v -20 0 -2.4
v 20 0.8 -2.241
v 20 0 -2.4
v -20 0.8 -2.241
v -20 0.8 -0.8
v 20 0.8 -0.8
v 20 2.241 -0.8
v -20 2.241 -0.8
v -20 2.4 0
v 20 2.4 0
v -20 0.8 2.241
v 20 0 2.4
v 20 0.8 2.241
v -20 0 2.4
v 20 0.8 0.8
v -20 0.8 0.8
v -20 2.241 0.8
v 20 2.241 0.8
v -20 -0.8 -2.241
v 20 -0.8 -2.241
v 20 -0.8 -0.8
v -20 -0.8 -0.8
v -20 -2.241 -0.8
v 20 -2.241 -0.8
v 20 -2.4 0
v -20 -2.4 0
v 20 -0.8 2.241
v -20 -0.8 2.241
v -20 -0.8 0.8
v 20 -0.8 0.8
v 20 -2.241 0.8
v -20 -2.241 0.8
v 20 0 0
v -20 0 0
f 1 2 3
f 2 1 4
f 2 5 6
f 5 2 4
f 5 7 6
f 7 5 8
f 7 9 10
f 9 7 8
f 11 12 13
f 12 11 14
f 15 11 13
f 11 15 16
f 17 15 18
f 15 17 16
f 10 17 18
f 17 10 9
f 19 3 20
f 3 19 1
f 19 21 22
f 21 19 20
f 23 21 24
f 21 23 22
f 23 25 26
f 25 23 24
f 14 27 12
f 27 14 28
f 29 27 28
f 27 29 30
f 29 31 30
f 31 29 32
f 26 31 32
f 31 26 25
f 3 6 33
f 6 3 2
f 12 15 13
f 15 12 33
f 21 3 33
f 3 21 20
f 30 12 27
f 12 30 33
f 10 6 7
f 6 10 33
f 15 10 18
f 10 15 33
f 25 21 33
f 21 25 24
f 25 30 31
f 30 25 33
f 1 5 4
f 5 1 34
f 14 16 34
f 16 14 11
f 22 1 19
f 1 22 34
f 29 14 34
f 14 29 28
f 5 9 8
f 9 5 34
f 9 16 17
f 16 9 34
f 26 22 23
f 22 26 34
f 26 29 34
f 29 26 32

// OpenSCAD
// file: ../p/4-4edge.scad
use <../lib.scad>
$fa=1; $fs=0.2;
function ldraw_lib__4_4edge(realsolid=false) = [
// 0 Circle 1.0
// 0 Name: 4-4edge.dat
// 0 Author: James Jessiman
// 0 !LDRAW_ORG Primitive UPDATE 2017-01
// 0 !LICENSE Licensed under CC BY 2.0 and CC BY 4.0 : see CAreadme.txt
// 
// 0 BFC CERTIFY CCW
  [0,"BFC","CERTIFY"],
  [0,"BFC","CCW"],
// 
// 0 !HISTORY 1998-12-15 [PTadmin] Official Update 1998-10
// 0 !HISTORY 2005-12-28 [PTadmin] Official Update 2005-01
// 0 !HISTORY 2007-06-24 [PTadmin] Header formatted for Contributor Agreement
// 0 !HISTORY 2008-07-01 [PTadmin] Official Update 2008-01
// 0 !HISTORY 2017-01-15 [Steffen] BFCed
// 0 !HISTORY 2017-12-30 [PTadmin] Official Update 2017-01
// 
// 
// 2 24 1 0 0 0.9239 0 0.3827
  [2,24,1,0,0,0.9239,0,0.3827],
// 2 24 0.9239 0 0.3827 0.7071 0 0.7071
  [2,24,0.9239,0,0.3827,0.7071,0,0.7071],
// 2 24 0.7071 0 0.7071 0.3827 0 0.9239
  [2,24,0.7071,0,0.7071,0.3827,0,0.9239],
// 2 24 0.3827 0 0.9239 0 0 1
  [2,24,0.3827,0,0.9239,0,0,1],
// 2 24 0 0 1 -0.3827 0 0.9239
  [2,24,0,0,1,-0.3827,0,0.9239],
// 2 24 -0.3827 0 0.9239 -0.7071 0 0.7071
  [2,24,-0.3827,0,0.9239,-0.7071,0,0.7071],
// 2 24 -0.7071 0 0.7071 -0.9239 0 0.3827
  [2,24,-0.7071,0,0.7071,-0.9239,0,0.3827],
// 2 24 -0.9239 0 0.3827 -1 0 -0
  [2,24,-0.9239,0,0.3827,-1,0,-0],
// 2 24 -1 0 -0 -0.9239 0 -0.3827
  [2,24,-1,0,-0,-0.9239,0,-0.3827],
// 2 24 -0.9239 0 -0.3827 -0.7071 0 -0.7071
  [2,24,-0.9239,0,-0.3827,-0.7071,0,-0.7071],
// 2 24 -0.7071 0 -0.7071 -0.3827 0 -0.9239
  [2,24,-0.7071,0,-0.7071,-0.3827,0,-0.9239],
// 2 24 -0.3827 0 -0.9239 0 0 -1
  [2,24,-0.3827,0,-0.9239,0,0,-1],
// 2 24 0 0 -1 0.3827 0 -0.9239
  [2,24,0,0,-1,0.3827,0,-0.9239],
// 2 24 0.3827 0 -0.9239 0.7071 0 -0.7071
  [2,24,0.3827,0,-0.9239,0.7071,0,-0.7071],
// 2 24 0.7071 0 -0.7071 0.9239 0 -0.3827
  [2,24,0.7071,0,-0.7071,0.9239,0,-0.3827],
// 2 24 0.9239 0 -0.3827 1 0 0
  [2,24,0.9239,0,-0.3827,1,0,0],
];
module ldraw_lib__4_4edge(step=0, col=false, unit=2/5, alt=false, line=0.2, solid=!$preview)
    makepoly(ldraw_lib__4_4edge(solid), step=step, col=col, unit=unit, alt=alt, line=line, solid=solid);
ldraw_lib__4_4edge(line=0.2);
// file: ../p/4-4disc.scad
use <../lib.scad>
$fa=1; $fs=0.2;
function ldraw_lib__4_4disc(realsolid=false) = [
// 0 Disc 1.0
// 0 Name: 4-4disc.dat
// 0 Author: James Jessiman
// 0 !LDRAW_ORG Primitive UPDATE 2002-02
// 0 !LICENSE Licensed under CC BY 2.0 and CC BY 4.0 : see CAreadme.txt
// 
// 0 BFC CERTIFY CCW
  [0,"BFC","CERTIFY"],
  [0,"BFC","CCW"],
// 
// 0 !HISTORY 1998-12-15 [PTadmin] Official Update 1998-10
// 0 !HISTORY 2002-03-23 [sbliss] Added BFC statement
// 0 !HISTORY 2002-04-25 [PTadmin] Official Update 2002-02
// 0 !HISTORY 2007-06-24 [PTadmin] Header formatted for Contributor Agreement
// 0 !HISTORY 2008-07-01 [PTadmin] Official Update 2008-01
// 
// 
// 3 16 0 0 0 1 0 0 0.9239 0 0.3827
  [3,16,0,0,0,1,0,0,0.9239,0,0.3827],
// 3 16 0 0 0 0.9239 0 0.3827 0.7071 0 0.7071
  [3,16,0,0,0,0.9239,0,0.3827,0.7071,0,0.7071],
// 3 16 0 0 0 0.7071 0 0.7071 0.3827 0 0.9239
  [3,16,0,0,0,0.7071,0,0.7071,0.3827,0,0.9239],
// 3 16 0 0 0 0.3827 0 0.9239 0 0 1
  [3,16,0,0,0,0.3827,0,0.9239,0,0,1],
// 3 16 0 0 0 0 0 1 -0.3827 0 0.9239
  [3,16,0,0,0,0,0,1,-0.3827,0,0.9239],
// 3 16 0 0 0 -0.3827 0 0.9239 -0.7071 0 0.7071
  [3,16,0,0,0,-0.3827,0,0.9239,-0.7071,0,0.7071],
// 3 16 0 0 0 -0.7071 0 0.7071 -0.9239 0 0.3827
  [3,16,0,0,0,-0.7071,0,0.7071,-0.9239,0,0.3827],
// 3 16 0 0 0 -0.9239 0 0.3827 -1 0 -0
  [3,16,0,0,0,-0.9239,0,0.3827,-1,0,-0],
// 3 16 0 0 0 -1 0 -0 -0.9239 0 -0.3827
  [3,16,0,0,0,-1,0,-0,-0.9239,0,-0.3827],
// 3 16 0 0 0 -0.9239 0 -0.3827 -0.7071 0 -0.7071
  [3,16,0,0,0,-0.9239,0,-0.3827,-0.7071,0,-0.7071],
// 3 16 0 0 0 -0.7071 0 -0.7071 -0.3827 0 -0.9239
  [3,16,0,0,0,-0.7071,0,-0.7071,-0.3827,0,-0.9239],
// 3 16 0 0 0 -0.3827 0 -0.9239 0 0 -1
  [3,16,0,0,0,-0.3827,0,-0.9239,0,0,-1],
// 3 16 0 0 0 0 0 -1 0.3827 0 -0.9239
  [3,16,0,0,0,0,0,-1,0.3827,0,-0.9239],
// 3 16 0 0 0 0.3827 0 -0.9239 0.7071 0 -0.7071
  [3,16,0,0,0,0.3827,0,-0.9239,0.7071,0,-0.7071],
// 3 16 0 0 0 0.7071 0 -0.7071 0.9239 0 -0.3827
  [3,16,0,0,0,0.7071,0,-0.7071,0.9239,0,-0.3827],
// 3 16 0 0 0 0.9239 0 -0.3827 1 0 0
  [3,16,0,0,0,0.9239,0,-0.3827,1,0,0],
// 0
];
module ldraw_lib__4_4disc(step=0, col=false, unit=2/5, alt=false, line=0.2, solid=!$preview)
    makepoly(ldraw_lib__4_4disc(solid), step=step, col=col, unit=unit, alt=alt, line=line, solid=solid);
ldraw_lib__4_4disc(line=0.2);
// file: ../p/4-4cyli.scad
use <../lib.scad>
$fa=1; $fs=0.2;
function ldraw_lib__4_4cyli(realsolid=false) = [
// 0 Cylinder 1.0
// 0 Name: 4-4cyli.dat
// 0 Author: James Jessiman
// 0 !LDRAW_ORG Primitive UPDATE 2005-01
// 0 !LICENSE Licensed under CC BY 2.0 and CC BY 4.0 : see CAreadme.txt
// 
// 0 BFC CERTIFY CCW
  [0,"BFC","CERTIFY"],
  [0,"BFC","CCW"],
// 
// 0 !HISTORY 1998-12-15 [PTadmin] Official Update 1998-10
// 0 !HISTORY 2002-03-23 [sbliss] Added BFC statement; merged headers from files in distributions LDraw 0.27 and Complete.
// 0 !HISTORY 2002-04-25 [PTadmin] Official Update 2002-02
// 0 !HISTORY 2004-12-14 [guyvivan] BFC CCW
// 0 !HISTORY 2005-12-28 [PTadmin] Official Update 2005-01
// 0 !HISTORY 2007-06-24 [PTadmin] Header formatted for Contributor Agreement
// 0 !HISTORY 2008-07-01 [PTadmin] Official Update 2008-01
// 
// 
// 4 16 1 1 0 0.9239 1 0.3827 0.9239 0 0.3827 1 0 0
  [4,16,1,1,0,0.9239,1,0.3827,0.9239,0,0.3827,1,0,0],
// 5 24 1 0 0 1 1 0 0.9239 0 0.3827 0.9239 0 -0.3827
  [5,24,1,0,0,1,1,0,0.9239,0,0.3827,0.9239,0,-0.3827],
// 4 16 0.9239 1 0.3827 0.7071 1 0.7071 0.7071 0 0.7071 0.9239 0 0.3827
  [4,16,0.9239,1,0.3827,0.7071,1,0.7071,0.7071,0,0.7071,0.9239,0,0.3827],
// 5 24 0.9239 0 0.3827 0.9239 1 0.3827 0.7071 0 0.7071 1 0 0
  [5,24,0.9239,0,0.3827,0.9239,1,0.3827,0.7071,0,0.7071,1,0,0],
// 4 16 0.7071 1 0.7071 0.3827 1 0.9239 0.3827 0 0.9239 0.7071 0 0.7071
  [4,16,0.7071,1,0.7071,0.3827,1,0.9239,0.3827,0,0.9239,0.7071,0,0.7071],
// 5 24 0.7071 0 0.7071 0.7071 1 0.7071 0.3827 0 0.9239 0.9239 0 0.3827
  [5,24,0.7071,0,0.7071,0.7071,1,0.7071,0.3827,0,0.9239,0.9239,0,0.3827],
// 4 16 0.3827 1 0.9239 0 1 1 0 0 1 0.3827 0 0.9239
  [4,16,0.3827,1,0.9239,0,1,1,0,0,1,0.3827,0,0.9239],
// 5 24 0.3827 0 0.9239 0.3827 1 0.9239 0 0 1 0.7071 0 0.7071
  [5,24,0.3827,0,0.9239,0.3827,1,0.9239,0,0,1,0.7071,0,0.7071],
// 4 16 0 1 1 -0.3827 1 0.9239 -0.3827 0 0.9239 0 0 1
  [4,16,0,1,1,-0.3827,1,0.9239,-0.3827,0,0.9239,0,0,1],
// 5 24 0 0 1 0 1 1 -0.3827 0 0.9239 0.3827 0 0.9239
  [5,24,0,0,1,0,1,1,-0.3827,0,0.9239,0.3827,0,0.9239],
// 4 16 -0.3827 1 0.9239 -0.7071 1 0.7071 -0.7071 0 0.7071 -0.3827 0 0.9239
  [4,16,-0.3827,1,0.9239,-0.7071,1,0.7071,-0.7071,0,0.7071,-0.3827,0,0.9239],
// 5 24 -0.3827 0 0.9239 -0.3827 1 0.9239 -0.7071 0 0.7071 0 0 1
  [5,24,-0.3827,0,0.9239,-0.3827,1,0.9239,-0.7071,0,0.7071,0,0,1],
// 4 16 -0.7071 1 0.7071 -0.9239 1 0.3827 -0.9239 0 0.3827 -0.7071 0 0.7071
  [4,16,-0.7071,1,0.7071,-0.9239,1,0.3827,-0.9239,0,0.3827,-0.7071,0,0.7071],
// 5 24 -0.7071 0 0.7071 -0.7071 1 0.7071 -0.9239 0 0.3827 -0.3827 0 0.9239
  [5,24,-0.7071,0,0.7071,-0.7071,1,0.7071,-0.9239,0,0.3827,-0.3827,0,0.9239],
// 4 16 -0.9239 1 0.3827 -1 1 0 -1 0 0 -0.9239 0 0.3827
  [4,16,-0.9239,1,0.3827,-1,1,0,-1,0,0,-0.9239,0,0.3827],
// 5 24 -0.9239 0 0.3827 -0.9239 1 0.3827 -1 0 0 -0.7071 0 0.7071
  [5,24,-0.9239,0,0.3827,-0.9239,1,0.3827,-1,0,0,-0.7071,0,0.7071],
// 4 16 -1 1 0 -0.9239 1 -0.3827 -0.9239 0 -0.3827 -1 0 0
  [4,16,-1,1,0,-0.9239,1,-0.3827,-0.9239,0,-0.3827,-1,0,0],
// 5 24 -1 0 0 -1 1 0 -0.9239 0 -0.3827 -0.9239 0 0.3827
  [5,24,-1,0,0,-1,1,0,-0.9239,0,-0.3827,-0.9239,0,0.3827],
// 4 16 -0.9239 1 -0.3827 -0.7071 1 -0.7071 -0.7071 0 -0.7071 -0.9239 0 -0.3827
  [4,16,-0.9239,1,-0.3827,-0.7071,1,-0.7071,-0.7071,0,-0.7071,-0.9239,0,-0.3827],
// 5 24 -0.9239 0 -0.3827 -0.9239 1 -0.3827 -0.7071 0 -0.7071 -1 0 0
  [5,24,-0.9239,0,-0.3827,-0.9239,1,-0.3827,-0.7071,0,-0.7071,-1,0,0],
// 4 16 -0.7071 1 -0.7071 -0.3827 1 -0.9239 -0.3827 0 -0.9239 -0.7071 0 -0.7071
  [4,16,-0.7071,1,-0.7071,-0.3827,1,-0.9239,-0.3827,0,-0.9239,-0.7071,0,-0.7071],
// 5 24 -0.7071 0 -0.7071 -0.7071 1 -0.7071 -0.3827 0 -0.9239 -0.9239 0 -0.3827
  [5,24,-0.7071,0,-0.7071,-0.7071,1,-0.7071,-0.3827,0,-0.9239,-0.9239,0,-0.3827],
// 4 16 -0.3827 1 -0.9239 0 1 -1 0 0 -1 -0.3827 0 -0.9239
  [4,16,-0.3827,1,-0.9239,0,1,-1,0,0,-1,-0.3827,0,-0.9239],
// 5 24 -0.3827 0 -0.9239 -0.3827 1 -0.9239 0 0 -1 -0.7071 0 -0.7071
  [5,24,-0.3827,0,-0.9239,-0.3827,1,-0.9239,0,0,-1,-0.7071,0,-0.7071],
// 4 16 0 1 -1 0.3827 1 -0.9239 0.3827 0 -0.9239 0 0 -1
  [4,16,0,1,-1,0.3827,1,-0.9239,0.3827,0,-0.9239,0,0,-1],
// 5 24 0 0 -1 0 1 -1 0.3827 0 -0.9239 -0.3827 0 -0.9239
  [5,24,0,0,-1,0,1,-1,0.3827,0,-0.9239,-0.3827,0,-0.9239],
// 4 16 0.3827 1 -0.9239 0.7071 1 -0.7071 0.7071 0 -0.7071 0.3827 0 -0.9239
  [4,16,0.3827,1,-0.9239,0.7071,1,-0.7071,0.7071,0,-0.7071,0.3827,0,-0.9239],
// 5 24 0.3827 0 -0.9239 0.3827 1 -0.9239 0.7071 0 -0.7071 0 0 -1
  [5,24,0.3827,0,-0.9239,0.3827,1,-0.9239,0.7071,0,-0.7071,0,0,-1],
// 4 16 0.7071 1 -0.7071 0.9239 1 -0.3827 0.9239 0 -0.3827 0.7071 0 -0.7071
  [4,16,0.7071,1,-0.7071,0.9239,1,-0.3827,0.9239,0,-0.3827,0.7071,0,-0.7071],
// 5 24 0.7071 0 -0.7071 0.7071 1 -0.7071 0.9239 0 -0.3827 0.3827 0 -0.9239
  [5,24,0.7071,0,-0.7071,0.7071,1,-0.7071,0.9239,0,-0.3827,0.3827,0,-0.9239],
// 4 16 0.9239 1 -0.3827 1 1 0 1 0 0 0.9239 0 -0.3827
  [4,16,0.9239,1,-0.3827,1,1,0,1,0,0,0.9239,0,-0.3827],
// 5 24 0.9239 0 -0.3827 0.9239 1 -0.3827 1 0 0 0.7071 0 -0.7071
  [5,24,0.9239,0,-0.3827,0.9239,1,-0.3827,1,0,0,0.7071,0,-0.7071],
// 0
];
module ldraw_lib__4_4cyli(step=0, col=false, unit=2/5, alt=false, line=0.2, solid=!$preview)
    makepoly(ldraw_lib__4_4cyli(solid), step=step, col=col, unit=unit, alt=alt, line=line, solid=solid);
ldraw_lib__4_4cyli(line=0.2);
// file: ../p/stud3.scad
use <../lib.scad>
use <4-4cyli.scad>
use <4-4disc.scad>
use <4-4edge.scad>
$fa=1; $fs=0.2;
function ldraw_lib__stud3(realsolid=false) = realsolid ? 
    [openscad(translate([0,0,-eps()], o=cylinder(4+eps(), r=4)),2)] : [
// 0 Stud Tube Solid
// 0 Name: stud3.dat
// 0 Author: James Jessiman
// 0 !LDRAW_ORG Primitive UPDATE 2012-01
// 0 !LICENSE Licensed under CC BY 2.0 and CC BY 4.0 : see CAreadme.txt
// 
// 0 BFC CERTIFY CCW
  [0,"BFC","CERTIFY"],
  [0,"BFC","CCW"],
// 
// 0 !HISTORY 2002-04-04 [sbliss] Modified for BFC compliance
// 0 !HISTORY 2002-04-25 [PTadmin] Official Update 2002-02
// 0 !HISTORY 2007-06-24 [PTadmin] Header formatted for Contributor Agreement
// 0 !HISTORY 2008-07-01 [PTadmin] Official Update 2008-01
// 0 !HISTORY 2012-02-16 [Philo] Changed to CCW
// 0 !HISTORY 2012-03-30 [PTadmin] Official Update 2012-01
// 
// 
// 1 16 0 -4 0 4 0 0 0 1 0 0 0 4 4-4edge.dat
  [1,16,0,-4,0,4,0,0,0,1,0,0,0,4, ldraw_lib__4_4edge(realsolid)],
// 1 16 0 0 0 4 0 0 0 1 0 0 0 4 4-4edge.dat
  [1,16,0,0,0,4,0,0,0,1,0,0,0,4, ldraw_lib__4_4edge(realsolid)],
// 1 16 0 -4 0 4 0 0 0 1 0 0 0 4 4-4disc.dat
  [1,16,0,-4,0,4,0,0,0,1,0,0,0,4, ldraw_lib__4_4disc(realsolid)],
// 1 16 0 -4 0 4 0 0 0 4 0 0 0 4 4-4cyli.dat
  [1,16,0,-4,0,4,0,0,0,4,0,0,0,4, ldraw_lib__4_4cyli(realsolid)],
];
module ldraw_lib__stud3(step=0, col=false, unit=2/5, alt=false, line=0.2, solid=!$preview)
    makepoly(ldraw_lib__stud3(solid), step=step, col=col, unit=unit, alt=alt, line=line, solid=solid);
ldraw_lib__stud3(line=0.2);
// file: ../p/stud.scad
use <../lib.scad>
use <4-4cyli.scad>
use <4-4disc.scad>
use <4-4edge.scad>
$fa=1; $fs=0.2;
function ldraw_lib__stud(realsolid=false) = realsolid ? 
    [openscad(translate([0,0,-eps()], o=cylinder(4+eps(), r=6)),2)] : [
// 0 Stud
// 0 Name: stud.dat
// 0 Author: James Jessiman
// 0 !LDRAW_ORG Primitive UPDATE 2012-01
// 0 !LICENSE Licensed under CC BY 2.0 and CC BY 4.0 : see CAreadme.txt
// 
// 0 BFC CERTIFY CCW
  [0,"BFC","CERTIFY"],
  [0,"BFC","CCW"],
// 
// 0 !HISTORY 2002-04-04 [sbliss] Modified for BFC compliance
// 0 !HISTORY 2002-04-25 [PTadmin] Official Update 2002-02
// 0 !HISTORY 2007-06-24 [PTadmin] Header formatted for Contributor Agreement
// 0 !HISTORY 2008-07-01 [PTadmin] Official Update 2008-01
// 0 !HISTORY 2012-02-16 [Philo] Changed to CCW
// 0 !HISTORY 2012-03-30 [PTadmin] Official Update 2012-01
// 
// 
// 1 16 0 0 0 6 0 0 0 1 0 0 0 6 4-4edge.dat
  [1,16,0,0,0,6,0,0,0,1,0,0,0,6, ldraw_lib__4_4edge(realsolid)],
// 1 16 0 -4 0 6 0 0 0 1 0 0 0 6 4-4edge.dat
  [1,16,0,-4,0,6,0,0,0,1,0,0,0,6, ldraw_lib__4_4edge(realsolid)],
// 1 16 0 0 0 6 0 0 0 -4 0 0 0 6 4-4cyli.dat
  [1,16,0,0,0,6,0,0,0,-4,0,0,0,6, ldraw_lib__4_4cyli(realsolid)],
// 1 16 0 -4 0 6 0 0 0 1 0 0 0 6 4-4disc.dat
  [1,16,0,-4,0,6,0,0,0,1,0,0,0,6, ldraw_lib__4_4disc(realsolid)],
];
module ldraw_lib__stud(step=0, col=false, unit=2/5, alt=false, line=0.2, solid=!$preview)
    makepoly(ldraw_lib__stud(solid), step=step, col=col, unit=unit, alt=alt, line=line, solid=solid);
ldraw_lib__stud(line=0.2);
// file: ../p/box5.scad
use <../lib.scad>
$fa=1; $fs=0.2;
function ldraw_lib__box5(realsolid=false) = [
// 0 Box with 5 Faces and All Edges
// 0 Name: box5.dat
// 0 Author: James Jessiman
// 0 !LDRAW_ORG Primitive UPDATE 2012-01
// 0 !LICENSE Licensed under CC BY 2.0 and CC BY 4.0 : see CAreadme.txt
// 
// 0 BFC CERTIFY CCW
  [0,"BFC","CERTIFY"],
  [0,"BFC","CCW"],
// 
// 0 !HISTORY 2002-04-03 [sbliss] Modified for BFC compliance
// 0 !HISTORY 2002-04-25 [PTadmin] Official Update 2002-02
// 0 !HISTORY 2007-06-24 [PTadmin] Header formatted for Contributor Agreement
// 0 !HISTORY 2008-07-01 [PTadmin] Official Update 2008-01
// 0 !HISTORY 2012-02-16 [Philo] Changed to CCW
// 0 !HISTORY 2012-03-30 [PTadmin] Official Update 2012-01
// 
// 
// 2 24 1 1 1 -1 1 1
  [2,24,1,1,1,-1,1,1],
// 2 24 -1 1 1 -1 1 -1
  [2,24,-1,1,1,-1,1,-1],
// 2 24 -1 1 -1 1 1 -1
  [2,24,-1,1,-1,1,1,-1],
// 2 24 1 1 -1 1 1 1
  [2,24,1,1,-1,1,1,1],
// 2 24 1 0 1 -1 0 1
  [2,24,1,0,1,-1,0,1],
// 2 24 -1 0 1 -1 0 -1
  [2,24,-1,0,1,-1,0,-1],
// 2 24 -1 0 -1 1 0 -1
  [2,24,-1,0,-1,1,0,-1],
// 2 24 1 0 -1 1 0 1
  [2,24,1,0,-1,1,0,1],
// 2 24 1 0 1 1 1 1
  [2,24,1,0,1,1,1,1],
// 2 24 -1 0 1 -1 1 1
  [2,24,-1,0,1,-1,1,1],
// 2 24 1 0 -1 1 1 -1
  [2,24,1,0,-1,1,1,-1],
// 2 24 -1 0 -1 -1 1 -1
  [2,24,-1,0,-1,-1,1,-1],
// 4 16 -1 1 1 1 1 1 1 1 -1 -1 1 -1
  [4,16,-1,1,1,1,1,1,1,1,-1,-1,1,-1],
// 4 16 -1 1 1 -1 0 1 1 0 1 1 1 1
  [4,16,-1,1,1,-1,0,1,1,0,1,1,1,1],
// 4 16 -1 1 -1 -1 0 -1 -1 0 1 -1 1 1
  [4,16,-1,1,-1,-1,0,-1,-1,0,1,-1,1,1],
// 4 16 1 1 -1 1 0 -1 -1 0 -1 -1 1 -1
  [4,16,1,1,-1,1,0,-1,-1,0,-1,-1,1,-1],
// 4 16 1 1 1 1 0 1 1 0 -1 1 1 -1
  [4,16,1,1,1,1,0,1,1,0,-1,1,1,-1],
];
module ldraw_lib__box5(step=0, col=false, unit=2/5, alt=false, line=0.2, solid=!$preview)
    makepoly(ldraw_lib__box5(solid), step=step, col=col, unit=unit, alt=alt, line=line, solid=solid);
ldraw_lib__box5(line=0.2);
// file: ../p/box4t.scad
use <../lib.scad>
$fa=1; $fs=0.2;
function ldraw_lib__box4t(realsolid=false) = [
// 0 Box with 4 Adjacent Faces and All Edges
// 0 Name: box4t.dat
// 0 Author: Tore Eriksson [Tore_Eriksson]
// 0 !LDRAW_ORG Primitive UPDATE 2003-02
// 0 !LICENSE Licensed under CC BY 2.0 and CC BY 4.0 : see CAreadme.txt
// 
// 0 BFC CERTIFY CCW
  [0,"BFC","CERTIFY"],
  [0,"BFC","CCW"],
// 
// 0 !HISTORY 1997-09-29 [PTadmin] Official Update 1997-15
// 0 !HISTORY 2002-08-31 [izanette] Modified with WINDZ for BFC compliance
// 0 !HISTORY 2003-08-01 [PTadmin] Official Update 2003-02
// 0 !HISTORY 2007-06-24 [PTadmin] Header formatted for Contributor Agreement
// 0 !HISTORY 2008-07-01 [PTadmin] Official Update 2008-01
// 
// 
// 2 24 1 1 1 -1 1 1
  [2,24,1,1,1,-1,1,1],
// 2 24 -1 1 1 -1 1 -1
  [2,24,-1,1,1,-1,1,-1],
// 2 24 -1 1 -1 1 1 -1
  [2,24,-1,1,-1,1,1,-1],
// 2 24 1 1 -1 1 1 1
  [2,24,1,1,-1,1,1,1],
// 2 24 1 0 1 -1 0 1
  [2,24,1,0,1,-1,0,1],
// 2 24 -1 0 1 -1 0 -1
  [2,24,-1,0,1,-1,0,-1],
// 2 24 -1 0 -1 1 0 -1
  [2,24,-1,0,-1,1,0,-1],
// 2 24 1 0 -1 1 0 1
  [2,24,1,0,-1,1,0,1],
// 2 24 1 0 1 1 1 1
  [2,24,1,0,1,1,1,1],
// 2 24 -1 0 1 -1 1 1
  [2,24,-1,0,1,-1,1,1],
// 2 24 1 0 -1 1 1 -1
  [2,24,1,0,-1,1,1,-1],
// 2 24 -1 0 -1 -1 1 -1
  [2,24,-1,0,-1,-1,1,-1],
// 4 16 1 1 1 1 1 -1 -1 1 -1 -1 1 1
  [4,16,1,1,1,1,1,-1,-1,1,-1,-1,1,1],
// 4 16 1 1 1 -1 1 1 -1 0 1 1 0 1
  [4,16,1,1,1,-1,1,1,-1,0,1,1,0,1],
// 4 16 -1 1 1 -1 1 -1 -1 0 -1 -1 0 1
  [4,16,-1,1,1,-1,1,-1,-1,0,-1,-1,0,1],
// 0 4 16 -1 1 -1 -1 0 -1 1 0 -1 1 1 -1
// 4 16 1 1 -1 1 1 1 1 0 1 1 0 -1
  [4,16,1,1,-1,1,1,1,1,0,1,1,0,-1],
// 0
];
module ldraw_lib__box4t(step=0, col=false, unit=2/5, alt=false, line=0.2, solid=!$preview)
    makepoly(ldraw_lib__box4t(solid), step=step, col=col, unit=unit, alt=alt, line=line, solid=solid);
ldraw_lib__box4t(line=0.2);
// file: s/3004s01.scad
use <../../lib.scad>
use <../../p/box4t.scad>
use <../../p/box5.scad>
use <../../p/stud.scad>
use <../../p/stud3.scad>
$fa=1; $fs=0.2;
function ldraw_lib__s__3004s01(realsolid=false) = [
// 0 ~Brick  1 x  2 without Front Face
// 0 Name: s\3004s01.dat
// 0 Author: James Jessiman
// 0 !LDRAW_ORG Subpart UPDATE 2003-03
// 0 !LICENSE Licensed under CC BY 2.0 and CC BY 4.0 : see CAreadme.txt
// 
// 0 BFC CERTIFY CCW
  [0,"BFC","CERTIFY"],
  [0,"BFC","CCW"],
// 
// 0 !HISTORY 2003-09-07 [jriley] Subfiling, BFC
// 0 !HISTORY 2003-12-19 [PTadmin] Official Update 2003-03
// 0 !HISTORY 2007-08-29 [PTadmin] Header formatted for Contributor Agreement
// 0 !HISTORY 2008-07-01 [PTadmin] Official Update 2008-01
// 
// 
// 1 16 0 4 0 1 0 0 0 -5 0 0 0 1 stud3.dat
  [1,16,0,4,0,1,0,0,0,-5,0,0,0,1, ldraw_lib__stud3(realsolid)],
// 0 BFC INVERTNEXT
  [0,"BFC","INVERTNEXT"],
// 1 16 0 24 0 16 0 0 0 -20 0 0 0 6 box5.dat
  [1,16,0,24,0,16,0,0,0,-20,0,0,0,6, ldraw_lib__box5(realsolid)],
// 4 16 20 24 10 16 24 6 -16 24 6 -20 24 10
  [4,16,20,24,10,16,24,6,-16,24,6,-20,24,10],
// 4 16 -20 24 10 -16 24 6 -16 24 -6 -20 24 -10
  [4,16,-20,24,10,-16,24,6,-16,24,-6,-20,24,-10],
// 4 16 -20 24 -10 -16 24 -6 16 24 -6 20 24 -10
  [4,16,-20,24,-10,-16,24,-6,16,24,-6,20,24,-10],
// 4 16 20 24 -10 16 24 -6 16 24 6 20 24 10
  [4,16,20,24,-10,16,24,-6,16,24,6,20,24,10],
// 1 16 0 24 0 20 0 0 0 -24 0 0 0 10 box4t.dat
  [1,16,0,24,0,20,0,0,0,-24,0,0,0,10, ldraw_lib__box4t(realsolid)],
// 1 16 10 0 0 1 0 0 0 1 0 0 0 1 stud.dat
  [1,16,10,0,0,1,0,0,0,1,0,0,0,1, ldraw_lib__stud(realsolid)],
// 1 16 -10 0 0 1 0 0 0 1 0 0 0 1 stud.dat
  [1,16,-10,0,0,1,0,0,0,1,0,0,0,1, ldraw_lib__stud(realsolid)],
// 0
];
module ldraw_lib__s__3004s01(step=0, col=false, unit=2/5, alt=false, line=0.2, solid=!$preview)
    makepoly(ldraw_lib__s__3004s01(solid), step=step, col=col, unit=unit, alt=alt, line=line, solid=solid);
ldraw_lib__s__3004s01(line=0.2);
// file: ../p/axle.scad
use <../lib.scad>
$fa=1; $fs=0.2;
function ldraw_lib__axle(realsolid=false) = [
// 0 Axle
// 0 Name: axle.dat
// 0 Author: James Jessiman
// 0 !LDRAW_ORG Primitive UPDATE 2003-01
// 0 !LICENSE Licensed under CC BY 2.0 and CC BY 4.0 : see CAreadme.txt
// 
// 0 BFC CERTIFY CCW
  [0,"BFC","CERTIFY"],
  [0,"BFC","CCW"],
// 
// 0 !HISTORY 2000-04-23 [sbliss] Added conditional edges along outermost diameters
// 0 !HISTORY 2000-05-07 [PTadmin] Official Update 2000-01
// 0 !HISTORY 2002-11-08 [OrionP] Adjusted fit and precision
// 0 !HISTORY 2003-03-12 [PTadmin] Official Update 2003-01
// 0 !HISTORY 2007-06-24 [PTadmin] Header formatted for Contributor Agreement
// 0 !HISTORY 2008-07-01 [PTadmin] Official Update 2008-01
// 
// 
// 5 24 6 0 0 6 1 0 5.602 0 2 5.602 0 -2
  [5,24,6,0,0,6,1,0,5.602,0,2,5.602,0,-2],
// 5 24 0 0 6 0 1 6 2 0 5.602 -2 0 5.602
  [5,24,0,0,6,0,1,6,2,0,5.602,-2,0,5.602],
// 5 24 -6 0 0 -6 1 0 -5.602 0 -2 -5.602 0 2
  [5,24,-6,0,0,-6,1,0,-5.602,0,-2,-5.602,0,2],
// 5 24 0 0 -6 0 1 -6 -2 0 -5.602 2 0 -5.602
  [5,24,0,0,-6,0,1,-6,-2,0,-5.602,2,0,-5.602],
// 
// 2 24 6 0 0 5.602 0 2
  [2,24,6,0,0,5.602,0,2],
// 2 24 5.602 0 2 2 0 2
  [2,24,5.602,0,2,2,0,2],
// 2 24 2 0 2 2 0 5.602
  [2,24,2,0,2,2,0,5.602],
// 2 24 2 0 5.602 0 0 6
  [2,24,2,0,5.602,0,0,6],
// 2 24 -6 0 0 -5.602 0 2
  [2,24,-6,0,0,-5.602,0,2],
// 2 24 -5.602 0 2 -2 0 2
  [2,24,-5.602,0,2,-2,0,2],
// 2 24 -2 0 2 -2 0 5.602
  [2,24,-2,0,2,-2,0,5.602],
// 2 24 -2 0 5.602 -0 0 6
  [2,24,-2,0,5.602,-0,0,6],
// 2 24 6 0 -0 5.602 0 -2
  [2,24,6,0,-0,5.602,0,-2],
// 2 24 5.602 0 -2 2 0 -2
  [2,24,5.602,0,-2,2,0,-2],
// 2 24 2 0 -2 2 0 -5.602
  [2,24,2,0,-2,2,0,-5.602],
// 2 24 2 0 -5.602 0 0 -6
  [2,24,2,0,-5.602,0,0,-6],
// 2 24 -6 0 -0 -5.602 0 -2
  [2,24,-6,0,-0,-5.602,0,-2],
// 2 24 -5.602 0 -2 -2 0 -2
  [2,24,-5.602,0,-2,-2,0,-2],
// 2 24 -2 0 -2 -2 0 -5.602
  [2,24,-2,0,-2,-2,0,-5.602],
// 2 24 -2 0 -5.602 -0 0 -6
  [2,24,-2,0,-5.602,-0,0,-6],
// 2 24 6 1 0 5.602 1 2
  [2,24,6,1,0,5.602,1,2],
// 2 24 5.602 1 2 2 1 2
  [2,24,5.602,1,2,2,1,2],
// 2 24 2 1 2 2 1 5.602
  [2,24,2,1,2,2,1,5.602],
// 2 24 2 1 5.602 0 1 6
  [2,24,2,1,5.602,0,1,6],
// 2 24 -6 1 0 -5.602 1 2
  [2,24,-6,1,0,-5.602,1,2],
// 2 24 -5.602 1 2 -2 1 2
  [2,24,-5.602,1,2,-2,1,2],
// 2 24 -2 1 2 -2 1 5.602
  [2,24,-2,1,2,-2,1,5.602],
// 2 24 -2 1 5.602 -0 1 6
  [2,24,-2,1,5.602,-0,1,6],
// 2 24 6 1 -0 5.602 1 -2
  [2,24,6,1,-0,5.602,1,-2],
// 2 24 5.602 1 -2 2 1 -2
  [2,24,5.602,1,-2,2,1,-2],
// 2 24 2 1 -2 2 1 -5.602
  [2,24,2,1,-2,2,1,-5.602],
// 2 24 2 1 -5.602 0 1 -6
  [2,24,2,1,-5.602,0,1,-6],
// 2 24 -6 1 -0 -5.602 1 -2
  [2,24,-6,1,-0,-5.602,1,-2],
// 2 24 -5.602 1 -2 -2 1 -2
  [2,24,-5.602,1,-2,-2,1,-2],
// 2 24 -2 1 -2 -2 1 -5.602
  [2,24,-2,1,-2,-2,1,-5.602],
// 2 24 -2 1 -5.602 -0 1 -6
  [2,24,-2,1,-5.602,-0,1,-6],
// 
// 2 24 5.602 0 2 5.602 1 2
  [2,24,5.602,0,2,5.602,1,2],
// 2 24 2 0 2 2 1 2
  [2,24,2,0,2,2,1,2],
// 2 24 2 0 5.602 2 1 5.602
  [2,24,2,0,5.602,2,1,5.602],
// 2 24 -5.602 0 2 -5.602 1 2
  [2,24,-5.602,0,2,-5.602,1,2],
// 2 24 -2 0 2 -2 1 2
  [2,24,-2,0,2,-2,1,2],
// 2 24 -2 0 5.602 -2 1 5.602
  [2,24,-2,0,5.602,-2,1,5.602],
// 2 24 5.602 0 -2 5.602 1 -2
  [2,24,5.602,0,-2,5.602,1,-2],
// 2 24 2 0 -2 2 1 -2
  [2,24,2,0,-2,2,1,-2],
// 2 24 2 0 -5.602 2 1 -5.602
  [2,24,2,0,-5.602,2,1,-5.602],
// 2 24 -5.602 0 -2 -5.602 1 -2
  [2,24,-5.602,0,-2,-5.602,1,-2],
// 2 24 -2 0 -2 -2 1 -2
  [2,24,-2,0,-2,-2,1,-2],
// 2 24 -2 0 -5.602 -2 1 -5.602
  [2,24,-2,0,-5.602,-2,1,-5.602],
// 
// 4 16 6 0 0 6 1 0 5.602 1 2 5.602 0 2
  [4,16,6,0,0,6,1,0,5.602,1,2,5.602,0,2],
// 4 16 5.602 0 2 5.602 1 2 2 1 2 2 0 2
  [4,16,5.602,0,2,5.602,1,2,2,1,2,2,0,2],
// 4 16 2 0 2 2 1 2 2 1 5.602 2 0 5.602
  [4,16,2,0,2,2,1,2,2,1,5.602,2,0,5.602],
// 4 16 2 0 5.602 2 1 5.602 0 1 6 0 0 6
  [4,16,2,0,5.602,2,1,5.602,0,1,6,0,0,6],
// 4 16 -6 0 0 -5.602 0 2 -5.602 1 2 -6 1 0
  [4,16,-6,0,0,-5.602,0,2,-5.602,1,2,-6,1,0],
// 4 16 -5.602 0 2 -2 0 2 -2 1 2 -5.602 1 2
  [4,16,-5.602,0,2,-2,0,2,-2,1,2,-5.602,1,2],
// 4 16 -2 0 2 -2 0 5.602 -2 1 5.602 -2 1 2
  [4,16,-2,0,2,-2,0,5.602,-2,1,5.602,-2,1,2],
// 4 16 -2 0 5.602 -0 0 6 -0 1 6 -2 1 5.602
  [4,16,-2,0,5.602,-0,0,6,-0,1,6,-2,1,5.602],
// 4 16 6 0 -0 5.602 0 -2 5.602 1 -2 6 1 -0
  [4,16,6,0,-0,5.602,0,-2,5.602,1,-2,6,1,-0],
// 4 16 5.602 0 -2 2 0 -2 2 1 -2 5.602 1 -2
  [4,16,5.602,0,-2,2,0,-2,2,1,-2,5.602,1,-2],
// 4 16 2 0 -2 2 0 -5.602 2 1 -5.602 2 1 -2
  [4,16,2,0,-2,2,0,-5.602,2,1,-5.602,2,1,-2],
// 4 16 2 0 -5.602 0 0 -6 0 1 -6 2 1 -5.602
  [4,16,2,0,-5.602,0,0,-6,0,1,-6,2,1,-5.602],
// 4 16 -6 0 -0 -6 1 -0 -5.602 1 -2 -5.602 0 -2
  [4,16,-6,0,-0,-6,1,-0,-5.602,1,-2,-5.602,0,-2],
// 4 16 -5.602 0 -2 -5.602 1 -2 -2 1 -2 -2 0 -2
  [4,16,-5.602,0,-2,-5.602,1,-2,-2,1,-2,-2,0,-2],
// 4 16 -2 0 -2 -2 1 -2 -2 1 -5.602 -2 0 -5.602
  [4,16,-2,0,-2,-2,1,-2,-2,1,-5.602,-2,0,-5.602],
// 4 16 -2 0 -5.602 -2 1 -5.602 -0 1 -6 -0 0 -6
  [4,16,-2,0,-5.602,-2,1,-5.602,-0,1,-6,-0,0,-6],
// 
// 4 16 6 0 0 5.602 0 2 2 0 2 0 0 0
  [4,16,6,0,0,5.602,0,2,2,0,2,0,0,0],
// 4 16 -6 0 0 0 0 0 -2 0 2 -5.602 0 2
  [4,16,-6,0,0,0,0,0,-2,0,2,-5.602,0,2],
// 4 16 6 0 0 0 0 0 2 0 -2 5.602 0 -2
  [4,16,6,0,0,0,0,0,2,0,-2,5.602,0,-2],
// 4 16 -6 0 0 -5.602 0 -2 -2 0 -2 0 0 0
  [4,16,-6,0,0,-5.602,0,-2,-2,0,-2,0,0,0],
// 4 16 0 0 6 0 0 0 2 0 2 2 0 5.602
  [4,16,0,0,6,0,0,0,2,0,2,2,0,5.602],
// 4 16 0 0 6 -2 0 5.602 -2 0 2 0 0 0
  [4,16,0,0,6,-2,0,5.602,-2,0,2,0,0,0],
// 4 16 0 0 -6 2 0 -5.602 2 0 -2 0 0 0
  [4,16,0,0,-6,2,0,-5.602,2,0,-2,0,0,0],
// 4 16 0 0 -6 0 0 0 -2 0 -2 -2 0 -5.602
  [4,16,0,0,-6,0,0,0,-2,0,-2,-2,0,-5.602],
// 4 16 6 1 0 0 1 0 2 1 2 5.602 1 2
  [4,16,6,1,0,0,1,0,2,1,2,5.602,1,2],
// 4 16 -6 1 0 -5.602 1 2 -2 1 2 0 1 0
  [4,16,-6,1,0,-5.602,1,2,-2,1,2,0,1,0],
// 4 16 6 1 0 5.602 1 -2 2 1 -2 0 1 0
  [4,16,6,1,0,5.602,1,-2,2,1,-2,0,1,0],
// 4 16 -6 1 0 0 1 0 -2 1 -2 -5.602 1 -2
  [4,16,-6,1,0,0,1,0,-2,1,-2,-5.602,1,-2],
// 4 16 0 1 6 2 1 5.602 2 1 2 0 1 0
  [4,16,0,1,6,2,1,5.602,2,1,2,0,1,0],
// 4 16 0 1 6 0 1 0 -2 1 2 -2 1 5.602
  [4,16,0,1,6,0,1,0,-2,1,2,-2,1,5.602],
// 4 16 0 1 -6 0 1 0 2 1 -2 2 1 -5.602
  [4,16,0,1,-6,0,1,0,2,1,-2,2,1,-5.602],
// 4 16 0 1 -6 -2 1 -5.602 -2 1 -2 0 1 0
  [4,16,0,1,-6,-2,1,-5.602,-2,1,-2,0,1,0],
// 0
];
module ldraw_lib__axle(step=0, col=false, unit=2/5, alt=false, line=0.2, solid=!$preview)
    makepoly(ldraw_lib__axle(solid), step=step, col=col, unit=unit, alt=alt, line=line, solid=solid);
ldraw_lib__axle(line=0.2);
// file: 3004.scad
use <../lib.scad>
use <s/3004s01.scad>
$fa=1; $fs=0.2;
function ldraw_lib__3004(realsolid=false) = [
// 0 Brick  1 x  2
// 0 Name: 3004.dat
// 0 Author: James Jessiman
// 0 !LDRAW_ORG Part UPDATE 2022-05
// 0 !LICENSE Licensed under CC BY 2.0 and CC BY 4.0 : see CAreadme.txt
// 
// 0 BFC CERTIFY CCW
  [0,"BFC","CERTIFY"],
  [0,"BFC","CCW"],
// 
// 0 !HISTORY 2001-10-26 [PTadmin] Official Update 2001-01
// 0 !HISTORY 2002-05-07 {unknown} BFC Certification
// 0 !HISTORY 2002-06-11 [PTadmin] Official Update 2002-03
// 0 !HISTORY 2007-05-07 [PTadmin] Header formatted for Contributor Agreement
// 0 !HISTORY 2008-07-01 [PTadmin] Official Update 2008-01
// 0 !HISTORY 2022-08-04 [MagFors] Using subfile
// 0 !HISTORY 2022-09-15 [PTadmin] Official Update 2022-05
// 
// 
// 1 16 0 0 0 1 0 0 0 1 0 0 0 1 s\3004s01.dat
  [1,16,0,0,0,1,0,0,0,1,0,0,0,1, ldraw_lib__s__3004s01(realsolid)],
// 4 16 -20 24 -10 20 24 -10 20 0 -10 -20 0 -10
  [4,16,-20,24,-10,20,24,-10,20,0,-10,-20,0,-10],
];
module ldraw_lib__3004(step=0, col=false, unit=2/5, alt=false, line=0.2, solid=!$preview)
    makepoly(ldraw_lib__3004(solid), step=step, col=col, unit=unit, alt=alt, line=line, solid=solid);
ldraw_lib__3004(line=0.2);
// file: 32073.scad
use <../lib.scad>
use <../p/axle.scad>
$fa=1; $fs=0.2;
function ldraw_lib__32073(realsolid=false) = [
// 0 Technic Axle  5
// 0 Name: 32073.dat
// 0 Author: William Howard [WilliamH]
// 0 !LDRAW_ORG Part UPDATE 2009-02
// 0 !LICENSE Licensed under CC BY 2.0 and CC BY 4.0 : see CAreadme.txt
// 
// 0 BFC CERTIFY CCW
  [0,"BFC","CERTIFY"],
  [0,"BFC","CCW"],
// 
// 0 !HISTORY 2009-09-03 [PTadmin] Official Update 2009-02
// 
// 
// 1 16 50 0 0 0 -100 0 1 0 0 0 0 1 axle.dat
  [1,16,50,0,0,0,-100,0,1,0,0,0,0,1, ldraw_lib__axle(realsolid)],
// 0
];
module ldraw_lib__32073(step=0, col=false, unit=2/5, alt=false, line=0.2, solid=!$preview)
    makepoly(ldraw_lib__32073(solid), step=step, col=col, unit=unit, alt=alt, line=line, solid=solid);
ldraw_lib__32073(line=0.2);
// main file
use <../lib.scad>
use <32073.scad>
$fa=1; $fs=0.2;
function ldraw_lib__205(realsolid=false) = [
// 0 ~Moved to 32073
// 0 Name: 205.dat
// 0 Author: [PTadmin]
// 0 !LDRAW_ORG Part UPDATE 1998-10
// 0 !LICENSE Licensed under CC BY 4.0 : see CAreadme.txt
// 
// 0 BFC CERTIFY CCW
  [0,"BFC","CERTIFY"],
  [0,"BFC","CCW"],
// 
// 0 !HISTORY 1998-01-12 [PTadmin] Official Update 1998-01
// 0 !HISTORY 1998-12-15 [PTadmin] Official Update 1998-10
// 0 !HISTORY 2007-05-08 [PTadmin] Header formatted for Contributor Agreement
// 0 !HISTORY 2008-07-01 [PTadmin] Official Update 2008-01
// 
// 
// 1 16 0 0 0 1 0 0 0 1 0 0 0 1 32073.dat
  [1,16,0,0,0,1,0,0,0,1,0,0,0,1, ldraw_lib__32073(realsolid)],
];
module ldraw_lib__205(step=0, col=false, unit=2/5, alt=false, line=0.2, solid=!$preview)
    makepoly(ldraw_lib__205(solid), step=step, col=col, unit=unit, alt=alt, line=line, solid=solid);
ldraw_lib__205(line=0.2);
